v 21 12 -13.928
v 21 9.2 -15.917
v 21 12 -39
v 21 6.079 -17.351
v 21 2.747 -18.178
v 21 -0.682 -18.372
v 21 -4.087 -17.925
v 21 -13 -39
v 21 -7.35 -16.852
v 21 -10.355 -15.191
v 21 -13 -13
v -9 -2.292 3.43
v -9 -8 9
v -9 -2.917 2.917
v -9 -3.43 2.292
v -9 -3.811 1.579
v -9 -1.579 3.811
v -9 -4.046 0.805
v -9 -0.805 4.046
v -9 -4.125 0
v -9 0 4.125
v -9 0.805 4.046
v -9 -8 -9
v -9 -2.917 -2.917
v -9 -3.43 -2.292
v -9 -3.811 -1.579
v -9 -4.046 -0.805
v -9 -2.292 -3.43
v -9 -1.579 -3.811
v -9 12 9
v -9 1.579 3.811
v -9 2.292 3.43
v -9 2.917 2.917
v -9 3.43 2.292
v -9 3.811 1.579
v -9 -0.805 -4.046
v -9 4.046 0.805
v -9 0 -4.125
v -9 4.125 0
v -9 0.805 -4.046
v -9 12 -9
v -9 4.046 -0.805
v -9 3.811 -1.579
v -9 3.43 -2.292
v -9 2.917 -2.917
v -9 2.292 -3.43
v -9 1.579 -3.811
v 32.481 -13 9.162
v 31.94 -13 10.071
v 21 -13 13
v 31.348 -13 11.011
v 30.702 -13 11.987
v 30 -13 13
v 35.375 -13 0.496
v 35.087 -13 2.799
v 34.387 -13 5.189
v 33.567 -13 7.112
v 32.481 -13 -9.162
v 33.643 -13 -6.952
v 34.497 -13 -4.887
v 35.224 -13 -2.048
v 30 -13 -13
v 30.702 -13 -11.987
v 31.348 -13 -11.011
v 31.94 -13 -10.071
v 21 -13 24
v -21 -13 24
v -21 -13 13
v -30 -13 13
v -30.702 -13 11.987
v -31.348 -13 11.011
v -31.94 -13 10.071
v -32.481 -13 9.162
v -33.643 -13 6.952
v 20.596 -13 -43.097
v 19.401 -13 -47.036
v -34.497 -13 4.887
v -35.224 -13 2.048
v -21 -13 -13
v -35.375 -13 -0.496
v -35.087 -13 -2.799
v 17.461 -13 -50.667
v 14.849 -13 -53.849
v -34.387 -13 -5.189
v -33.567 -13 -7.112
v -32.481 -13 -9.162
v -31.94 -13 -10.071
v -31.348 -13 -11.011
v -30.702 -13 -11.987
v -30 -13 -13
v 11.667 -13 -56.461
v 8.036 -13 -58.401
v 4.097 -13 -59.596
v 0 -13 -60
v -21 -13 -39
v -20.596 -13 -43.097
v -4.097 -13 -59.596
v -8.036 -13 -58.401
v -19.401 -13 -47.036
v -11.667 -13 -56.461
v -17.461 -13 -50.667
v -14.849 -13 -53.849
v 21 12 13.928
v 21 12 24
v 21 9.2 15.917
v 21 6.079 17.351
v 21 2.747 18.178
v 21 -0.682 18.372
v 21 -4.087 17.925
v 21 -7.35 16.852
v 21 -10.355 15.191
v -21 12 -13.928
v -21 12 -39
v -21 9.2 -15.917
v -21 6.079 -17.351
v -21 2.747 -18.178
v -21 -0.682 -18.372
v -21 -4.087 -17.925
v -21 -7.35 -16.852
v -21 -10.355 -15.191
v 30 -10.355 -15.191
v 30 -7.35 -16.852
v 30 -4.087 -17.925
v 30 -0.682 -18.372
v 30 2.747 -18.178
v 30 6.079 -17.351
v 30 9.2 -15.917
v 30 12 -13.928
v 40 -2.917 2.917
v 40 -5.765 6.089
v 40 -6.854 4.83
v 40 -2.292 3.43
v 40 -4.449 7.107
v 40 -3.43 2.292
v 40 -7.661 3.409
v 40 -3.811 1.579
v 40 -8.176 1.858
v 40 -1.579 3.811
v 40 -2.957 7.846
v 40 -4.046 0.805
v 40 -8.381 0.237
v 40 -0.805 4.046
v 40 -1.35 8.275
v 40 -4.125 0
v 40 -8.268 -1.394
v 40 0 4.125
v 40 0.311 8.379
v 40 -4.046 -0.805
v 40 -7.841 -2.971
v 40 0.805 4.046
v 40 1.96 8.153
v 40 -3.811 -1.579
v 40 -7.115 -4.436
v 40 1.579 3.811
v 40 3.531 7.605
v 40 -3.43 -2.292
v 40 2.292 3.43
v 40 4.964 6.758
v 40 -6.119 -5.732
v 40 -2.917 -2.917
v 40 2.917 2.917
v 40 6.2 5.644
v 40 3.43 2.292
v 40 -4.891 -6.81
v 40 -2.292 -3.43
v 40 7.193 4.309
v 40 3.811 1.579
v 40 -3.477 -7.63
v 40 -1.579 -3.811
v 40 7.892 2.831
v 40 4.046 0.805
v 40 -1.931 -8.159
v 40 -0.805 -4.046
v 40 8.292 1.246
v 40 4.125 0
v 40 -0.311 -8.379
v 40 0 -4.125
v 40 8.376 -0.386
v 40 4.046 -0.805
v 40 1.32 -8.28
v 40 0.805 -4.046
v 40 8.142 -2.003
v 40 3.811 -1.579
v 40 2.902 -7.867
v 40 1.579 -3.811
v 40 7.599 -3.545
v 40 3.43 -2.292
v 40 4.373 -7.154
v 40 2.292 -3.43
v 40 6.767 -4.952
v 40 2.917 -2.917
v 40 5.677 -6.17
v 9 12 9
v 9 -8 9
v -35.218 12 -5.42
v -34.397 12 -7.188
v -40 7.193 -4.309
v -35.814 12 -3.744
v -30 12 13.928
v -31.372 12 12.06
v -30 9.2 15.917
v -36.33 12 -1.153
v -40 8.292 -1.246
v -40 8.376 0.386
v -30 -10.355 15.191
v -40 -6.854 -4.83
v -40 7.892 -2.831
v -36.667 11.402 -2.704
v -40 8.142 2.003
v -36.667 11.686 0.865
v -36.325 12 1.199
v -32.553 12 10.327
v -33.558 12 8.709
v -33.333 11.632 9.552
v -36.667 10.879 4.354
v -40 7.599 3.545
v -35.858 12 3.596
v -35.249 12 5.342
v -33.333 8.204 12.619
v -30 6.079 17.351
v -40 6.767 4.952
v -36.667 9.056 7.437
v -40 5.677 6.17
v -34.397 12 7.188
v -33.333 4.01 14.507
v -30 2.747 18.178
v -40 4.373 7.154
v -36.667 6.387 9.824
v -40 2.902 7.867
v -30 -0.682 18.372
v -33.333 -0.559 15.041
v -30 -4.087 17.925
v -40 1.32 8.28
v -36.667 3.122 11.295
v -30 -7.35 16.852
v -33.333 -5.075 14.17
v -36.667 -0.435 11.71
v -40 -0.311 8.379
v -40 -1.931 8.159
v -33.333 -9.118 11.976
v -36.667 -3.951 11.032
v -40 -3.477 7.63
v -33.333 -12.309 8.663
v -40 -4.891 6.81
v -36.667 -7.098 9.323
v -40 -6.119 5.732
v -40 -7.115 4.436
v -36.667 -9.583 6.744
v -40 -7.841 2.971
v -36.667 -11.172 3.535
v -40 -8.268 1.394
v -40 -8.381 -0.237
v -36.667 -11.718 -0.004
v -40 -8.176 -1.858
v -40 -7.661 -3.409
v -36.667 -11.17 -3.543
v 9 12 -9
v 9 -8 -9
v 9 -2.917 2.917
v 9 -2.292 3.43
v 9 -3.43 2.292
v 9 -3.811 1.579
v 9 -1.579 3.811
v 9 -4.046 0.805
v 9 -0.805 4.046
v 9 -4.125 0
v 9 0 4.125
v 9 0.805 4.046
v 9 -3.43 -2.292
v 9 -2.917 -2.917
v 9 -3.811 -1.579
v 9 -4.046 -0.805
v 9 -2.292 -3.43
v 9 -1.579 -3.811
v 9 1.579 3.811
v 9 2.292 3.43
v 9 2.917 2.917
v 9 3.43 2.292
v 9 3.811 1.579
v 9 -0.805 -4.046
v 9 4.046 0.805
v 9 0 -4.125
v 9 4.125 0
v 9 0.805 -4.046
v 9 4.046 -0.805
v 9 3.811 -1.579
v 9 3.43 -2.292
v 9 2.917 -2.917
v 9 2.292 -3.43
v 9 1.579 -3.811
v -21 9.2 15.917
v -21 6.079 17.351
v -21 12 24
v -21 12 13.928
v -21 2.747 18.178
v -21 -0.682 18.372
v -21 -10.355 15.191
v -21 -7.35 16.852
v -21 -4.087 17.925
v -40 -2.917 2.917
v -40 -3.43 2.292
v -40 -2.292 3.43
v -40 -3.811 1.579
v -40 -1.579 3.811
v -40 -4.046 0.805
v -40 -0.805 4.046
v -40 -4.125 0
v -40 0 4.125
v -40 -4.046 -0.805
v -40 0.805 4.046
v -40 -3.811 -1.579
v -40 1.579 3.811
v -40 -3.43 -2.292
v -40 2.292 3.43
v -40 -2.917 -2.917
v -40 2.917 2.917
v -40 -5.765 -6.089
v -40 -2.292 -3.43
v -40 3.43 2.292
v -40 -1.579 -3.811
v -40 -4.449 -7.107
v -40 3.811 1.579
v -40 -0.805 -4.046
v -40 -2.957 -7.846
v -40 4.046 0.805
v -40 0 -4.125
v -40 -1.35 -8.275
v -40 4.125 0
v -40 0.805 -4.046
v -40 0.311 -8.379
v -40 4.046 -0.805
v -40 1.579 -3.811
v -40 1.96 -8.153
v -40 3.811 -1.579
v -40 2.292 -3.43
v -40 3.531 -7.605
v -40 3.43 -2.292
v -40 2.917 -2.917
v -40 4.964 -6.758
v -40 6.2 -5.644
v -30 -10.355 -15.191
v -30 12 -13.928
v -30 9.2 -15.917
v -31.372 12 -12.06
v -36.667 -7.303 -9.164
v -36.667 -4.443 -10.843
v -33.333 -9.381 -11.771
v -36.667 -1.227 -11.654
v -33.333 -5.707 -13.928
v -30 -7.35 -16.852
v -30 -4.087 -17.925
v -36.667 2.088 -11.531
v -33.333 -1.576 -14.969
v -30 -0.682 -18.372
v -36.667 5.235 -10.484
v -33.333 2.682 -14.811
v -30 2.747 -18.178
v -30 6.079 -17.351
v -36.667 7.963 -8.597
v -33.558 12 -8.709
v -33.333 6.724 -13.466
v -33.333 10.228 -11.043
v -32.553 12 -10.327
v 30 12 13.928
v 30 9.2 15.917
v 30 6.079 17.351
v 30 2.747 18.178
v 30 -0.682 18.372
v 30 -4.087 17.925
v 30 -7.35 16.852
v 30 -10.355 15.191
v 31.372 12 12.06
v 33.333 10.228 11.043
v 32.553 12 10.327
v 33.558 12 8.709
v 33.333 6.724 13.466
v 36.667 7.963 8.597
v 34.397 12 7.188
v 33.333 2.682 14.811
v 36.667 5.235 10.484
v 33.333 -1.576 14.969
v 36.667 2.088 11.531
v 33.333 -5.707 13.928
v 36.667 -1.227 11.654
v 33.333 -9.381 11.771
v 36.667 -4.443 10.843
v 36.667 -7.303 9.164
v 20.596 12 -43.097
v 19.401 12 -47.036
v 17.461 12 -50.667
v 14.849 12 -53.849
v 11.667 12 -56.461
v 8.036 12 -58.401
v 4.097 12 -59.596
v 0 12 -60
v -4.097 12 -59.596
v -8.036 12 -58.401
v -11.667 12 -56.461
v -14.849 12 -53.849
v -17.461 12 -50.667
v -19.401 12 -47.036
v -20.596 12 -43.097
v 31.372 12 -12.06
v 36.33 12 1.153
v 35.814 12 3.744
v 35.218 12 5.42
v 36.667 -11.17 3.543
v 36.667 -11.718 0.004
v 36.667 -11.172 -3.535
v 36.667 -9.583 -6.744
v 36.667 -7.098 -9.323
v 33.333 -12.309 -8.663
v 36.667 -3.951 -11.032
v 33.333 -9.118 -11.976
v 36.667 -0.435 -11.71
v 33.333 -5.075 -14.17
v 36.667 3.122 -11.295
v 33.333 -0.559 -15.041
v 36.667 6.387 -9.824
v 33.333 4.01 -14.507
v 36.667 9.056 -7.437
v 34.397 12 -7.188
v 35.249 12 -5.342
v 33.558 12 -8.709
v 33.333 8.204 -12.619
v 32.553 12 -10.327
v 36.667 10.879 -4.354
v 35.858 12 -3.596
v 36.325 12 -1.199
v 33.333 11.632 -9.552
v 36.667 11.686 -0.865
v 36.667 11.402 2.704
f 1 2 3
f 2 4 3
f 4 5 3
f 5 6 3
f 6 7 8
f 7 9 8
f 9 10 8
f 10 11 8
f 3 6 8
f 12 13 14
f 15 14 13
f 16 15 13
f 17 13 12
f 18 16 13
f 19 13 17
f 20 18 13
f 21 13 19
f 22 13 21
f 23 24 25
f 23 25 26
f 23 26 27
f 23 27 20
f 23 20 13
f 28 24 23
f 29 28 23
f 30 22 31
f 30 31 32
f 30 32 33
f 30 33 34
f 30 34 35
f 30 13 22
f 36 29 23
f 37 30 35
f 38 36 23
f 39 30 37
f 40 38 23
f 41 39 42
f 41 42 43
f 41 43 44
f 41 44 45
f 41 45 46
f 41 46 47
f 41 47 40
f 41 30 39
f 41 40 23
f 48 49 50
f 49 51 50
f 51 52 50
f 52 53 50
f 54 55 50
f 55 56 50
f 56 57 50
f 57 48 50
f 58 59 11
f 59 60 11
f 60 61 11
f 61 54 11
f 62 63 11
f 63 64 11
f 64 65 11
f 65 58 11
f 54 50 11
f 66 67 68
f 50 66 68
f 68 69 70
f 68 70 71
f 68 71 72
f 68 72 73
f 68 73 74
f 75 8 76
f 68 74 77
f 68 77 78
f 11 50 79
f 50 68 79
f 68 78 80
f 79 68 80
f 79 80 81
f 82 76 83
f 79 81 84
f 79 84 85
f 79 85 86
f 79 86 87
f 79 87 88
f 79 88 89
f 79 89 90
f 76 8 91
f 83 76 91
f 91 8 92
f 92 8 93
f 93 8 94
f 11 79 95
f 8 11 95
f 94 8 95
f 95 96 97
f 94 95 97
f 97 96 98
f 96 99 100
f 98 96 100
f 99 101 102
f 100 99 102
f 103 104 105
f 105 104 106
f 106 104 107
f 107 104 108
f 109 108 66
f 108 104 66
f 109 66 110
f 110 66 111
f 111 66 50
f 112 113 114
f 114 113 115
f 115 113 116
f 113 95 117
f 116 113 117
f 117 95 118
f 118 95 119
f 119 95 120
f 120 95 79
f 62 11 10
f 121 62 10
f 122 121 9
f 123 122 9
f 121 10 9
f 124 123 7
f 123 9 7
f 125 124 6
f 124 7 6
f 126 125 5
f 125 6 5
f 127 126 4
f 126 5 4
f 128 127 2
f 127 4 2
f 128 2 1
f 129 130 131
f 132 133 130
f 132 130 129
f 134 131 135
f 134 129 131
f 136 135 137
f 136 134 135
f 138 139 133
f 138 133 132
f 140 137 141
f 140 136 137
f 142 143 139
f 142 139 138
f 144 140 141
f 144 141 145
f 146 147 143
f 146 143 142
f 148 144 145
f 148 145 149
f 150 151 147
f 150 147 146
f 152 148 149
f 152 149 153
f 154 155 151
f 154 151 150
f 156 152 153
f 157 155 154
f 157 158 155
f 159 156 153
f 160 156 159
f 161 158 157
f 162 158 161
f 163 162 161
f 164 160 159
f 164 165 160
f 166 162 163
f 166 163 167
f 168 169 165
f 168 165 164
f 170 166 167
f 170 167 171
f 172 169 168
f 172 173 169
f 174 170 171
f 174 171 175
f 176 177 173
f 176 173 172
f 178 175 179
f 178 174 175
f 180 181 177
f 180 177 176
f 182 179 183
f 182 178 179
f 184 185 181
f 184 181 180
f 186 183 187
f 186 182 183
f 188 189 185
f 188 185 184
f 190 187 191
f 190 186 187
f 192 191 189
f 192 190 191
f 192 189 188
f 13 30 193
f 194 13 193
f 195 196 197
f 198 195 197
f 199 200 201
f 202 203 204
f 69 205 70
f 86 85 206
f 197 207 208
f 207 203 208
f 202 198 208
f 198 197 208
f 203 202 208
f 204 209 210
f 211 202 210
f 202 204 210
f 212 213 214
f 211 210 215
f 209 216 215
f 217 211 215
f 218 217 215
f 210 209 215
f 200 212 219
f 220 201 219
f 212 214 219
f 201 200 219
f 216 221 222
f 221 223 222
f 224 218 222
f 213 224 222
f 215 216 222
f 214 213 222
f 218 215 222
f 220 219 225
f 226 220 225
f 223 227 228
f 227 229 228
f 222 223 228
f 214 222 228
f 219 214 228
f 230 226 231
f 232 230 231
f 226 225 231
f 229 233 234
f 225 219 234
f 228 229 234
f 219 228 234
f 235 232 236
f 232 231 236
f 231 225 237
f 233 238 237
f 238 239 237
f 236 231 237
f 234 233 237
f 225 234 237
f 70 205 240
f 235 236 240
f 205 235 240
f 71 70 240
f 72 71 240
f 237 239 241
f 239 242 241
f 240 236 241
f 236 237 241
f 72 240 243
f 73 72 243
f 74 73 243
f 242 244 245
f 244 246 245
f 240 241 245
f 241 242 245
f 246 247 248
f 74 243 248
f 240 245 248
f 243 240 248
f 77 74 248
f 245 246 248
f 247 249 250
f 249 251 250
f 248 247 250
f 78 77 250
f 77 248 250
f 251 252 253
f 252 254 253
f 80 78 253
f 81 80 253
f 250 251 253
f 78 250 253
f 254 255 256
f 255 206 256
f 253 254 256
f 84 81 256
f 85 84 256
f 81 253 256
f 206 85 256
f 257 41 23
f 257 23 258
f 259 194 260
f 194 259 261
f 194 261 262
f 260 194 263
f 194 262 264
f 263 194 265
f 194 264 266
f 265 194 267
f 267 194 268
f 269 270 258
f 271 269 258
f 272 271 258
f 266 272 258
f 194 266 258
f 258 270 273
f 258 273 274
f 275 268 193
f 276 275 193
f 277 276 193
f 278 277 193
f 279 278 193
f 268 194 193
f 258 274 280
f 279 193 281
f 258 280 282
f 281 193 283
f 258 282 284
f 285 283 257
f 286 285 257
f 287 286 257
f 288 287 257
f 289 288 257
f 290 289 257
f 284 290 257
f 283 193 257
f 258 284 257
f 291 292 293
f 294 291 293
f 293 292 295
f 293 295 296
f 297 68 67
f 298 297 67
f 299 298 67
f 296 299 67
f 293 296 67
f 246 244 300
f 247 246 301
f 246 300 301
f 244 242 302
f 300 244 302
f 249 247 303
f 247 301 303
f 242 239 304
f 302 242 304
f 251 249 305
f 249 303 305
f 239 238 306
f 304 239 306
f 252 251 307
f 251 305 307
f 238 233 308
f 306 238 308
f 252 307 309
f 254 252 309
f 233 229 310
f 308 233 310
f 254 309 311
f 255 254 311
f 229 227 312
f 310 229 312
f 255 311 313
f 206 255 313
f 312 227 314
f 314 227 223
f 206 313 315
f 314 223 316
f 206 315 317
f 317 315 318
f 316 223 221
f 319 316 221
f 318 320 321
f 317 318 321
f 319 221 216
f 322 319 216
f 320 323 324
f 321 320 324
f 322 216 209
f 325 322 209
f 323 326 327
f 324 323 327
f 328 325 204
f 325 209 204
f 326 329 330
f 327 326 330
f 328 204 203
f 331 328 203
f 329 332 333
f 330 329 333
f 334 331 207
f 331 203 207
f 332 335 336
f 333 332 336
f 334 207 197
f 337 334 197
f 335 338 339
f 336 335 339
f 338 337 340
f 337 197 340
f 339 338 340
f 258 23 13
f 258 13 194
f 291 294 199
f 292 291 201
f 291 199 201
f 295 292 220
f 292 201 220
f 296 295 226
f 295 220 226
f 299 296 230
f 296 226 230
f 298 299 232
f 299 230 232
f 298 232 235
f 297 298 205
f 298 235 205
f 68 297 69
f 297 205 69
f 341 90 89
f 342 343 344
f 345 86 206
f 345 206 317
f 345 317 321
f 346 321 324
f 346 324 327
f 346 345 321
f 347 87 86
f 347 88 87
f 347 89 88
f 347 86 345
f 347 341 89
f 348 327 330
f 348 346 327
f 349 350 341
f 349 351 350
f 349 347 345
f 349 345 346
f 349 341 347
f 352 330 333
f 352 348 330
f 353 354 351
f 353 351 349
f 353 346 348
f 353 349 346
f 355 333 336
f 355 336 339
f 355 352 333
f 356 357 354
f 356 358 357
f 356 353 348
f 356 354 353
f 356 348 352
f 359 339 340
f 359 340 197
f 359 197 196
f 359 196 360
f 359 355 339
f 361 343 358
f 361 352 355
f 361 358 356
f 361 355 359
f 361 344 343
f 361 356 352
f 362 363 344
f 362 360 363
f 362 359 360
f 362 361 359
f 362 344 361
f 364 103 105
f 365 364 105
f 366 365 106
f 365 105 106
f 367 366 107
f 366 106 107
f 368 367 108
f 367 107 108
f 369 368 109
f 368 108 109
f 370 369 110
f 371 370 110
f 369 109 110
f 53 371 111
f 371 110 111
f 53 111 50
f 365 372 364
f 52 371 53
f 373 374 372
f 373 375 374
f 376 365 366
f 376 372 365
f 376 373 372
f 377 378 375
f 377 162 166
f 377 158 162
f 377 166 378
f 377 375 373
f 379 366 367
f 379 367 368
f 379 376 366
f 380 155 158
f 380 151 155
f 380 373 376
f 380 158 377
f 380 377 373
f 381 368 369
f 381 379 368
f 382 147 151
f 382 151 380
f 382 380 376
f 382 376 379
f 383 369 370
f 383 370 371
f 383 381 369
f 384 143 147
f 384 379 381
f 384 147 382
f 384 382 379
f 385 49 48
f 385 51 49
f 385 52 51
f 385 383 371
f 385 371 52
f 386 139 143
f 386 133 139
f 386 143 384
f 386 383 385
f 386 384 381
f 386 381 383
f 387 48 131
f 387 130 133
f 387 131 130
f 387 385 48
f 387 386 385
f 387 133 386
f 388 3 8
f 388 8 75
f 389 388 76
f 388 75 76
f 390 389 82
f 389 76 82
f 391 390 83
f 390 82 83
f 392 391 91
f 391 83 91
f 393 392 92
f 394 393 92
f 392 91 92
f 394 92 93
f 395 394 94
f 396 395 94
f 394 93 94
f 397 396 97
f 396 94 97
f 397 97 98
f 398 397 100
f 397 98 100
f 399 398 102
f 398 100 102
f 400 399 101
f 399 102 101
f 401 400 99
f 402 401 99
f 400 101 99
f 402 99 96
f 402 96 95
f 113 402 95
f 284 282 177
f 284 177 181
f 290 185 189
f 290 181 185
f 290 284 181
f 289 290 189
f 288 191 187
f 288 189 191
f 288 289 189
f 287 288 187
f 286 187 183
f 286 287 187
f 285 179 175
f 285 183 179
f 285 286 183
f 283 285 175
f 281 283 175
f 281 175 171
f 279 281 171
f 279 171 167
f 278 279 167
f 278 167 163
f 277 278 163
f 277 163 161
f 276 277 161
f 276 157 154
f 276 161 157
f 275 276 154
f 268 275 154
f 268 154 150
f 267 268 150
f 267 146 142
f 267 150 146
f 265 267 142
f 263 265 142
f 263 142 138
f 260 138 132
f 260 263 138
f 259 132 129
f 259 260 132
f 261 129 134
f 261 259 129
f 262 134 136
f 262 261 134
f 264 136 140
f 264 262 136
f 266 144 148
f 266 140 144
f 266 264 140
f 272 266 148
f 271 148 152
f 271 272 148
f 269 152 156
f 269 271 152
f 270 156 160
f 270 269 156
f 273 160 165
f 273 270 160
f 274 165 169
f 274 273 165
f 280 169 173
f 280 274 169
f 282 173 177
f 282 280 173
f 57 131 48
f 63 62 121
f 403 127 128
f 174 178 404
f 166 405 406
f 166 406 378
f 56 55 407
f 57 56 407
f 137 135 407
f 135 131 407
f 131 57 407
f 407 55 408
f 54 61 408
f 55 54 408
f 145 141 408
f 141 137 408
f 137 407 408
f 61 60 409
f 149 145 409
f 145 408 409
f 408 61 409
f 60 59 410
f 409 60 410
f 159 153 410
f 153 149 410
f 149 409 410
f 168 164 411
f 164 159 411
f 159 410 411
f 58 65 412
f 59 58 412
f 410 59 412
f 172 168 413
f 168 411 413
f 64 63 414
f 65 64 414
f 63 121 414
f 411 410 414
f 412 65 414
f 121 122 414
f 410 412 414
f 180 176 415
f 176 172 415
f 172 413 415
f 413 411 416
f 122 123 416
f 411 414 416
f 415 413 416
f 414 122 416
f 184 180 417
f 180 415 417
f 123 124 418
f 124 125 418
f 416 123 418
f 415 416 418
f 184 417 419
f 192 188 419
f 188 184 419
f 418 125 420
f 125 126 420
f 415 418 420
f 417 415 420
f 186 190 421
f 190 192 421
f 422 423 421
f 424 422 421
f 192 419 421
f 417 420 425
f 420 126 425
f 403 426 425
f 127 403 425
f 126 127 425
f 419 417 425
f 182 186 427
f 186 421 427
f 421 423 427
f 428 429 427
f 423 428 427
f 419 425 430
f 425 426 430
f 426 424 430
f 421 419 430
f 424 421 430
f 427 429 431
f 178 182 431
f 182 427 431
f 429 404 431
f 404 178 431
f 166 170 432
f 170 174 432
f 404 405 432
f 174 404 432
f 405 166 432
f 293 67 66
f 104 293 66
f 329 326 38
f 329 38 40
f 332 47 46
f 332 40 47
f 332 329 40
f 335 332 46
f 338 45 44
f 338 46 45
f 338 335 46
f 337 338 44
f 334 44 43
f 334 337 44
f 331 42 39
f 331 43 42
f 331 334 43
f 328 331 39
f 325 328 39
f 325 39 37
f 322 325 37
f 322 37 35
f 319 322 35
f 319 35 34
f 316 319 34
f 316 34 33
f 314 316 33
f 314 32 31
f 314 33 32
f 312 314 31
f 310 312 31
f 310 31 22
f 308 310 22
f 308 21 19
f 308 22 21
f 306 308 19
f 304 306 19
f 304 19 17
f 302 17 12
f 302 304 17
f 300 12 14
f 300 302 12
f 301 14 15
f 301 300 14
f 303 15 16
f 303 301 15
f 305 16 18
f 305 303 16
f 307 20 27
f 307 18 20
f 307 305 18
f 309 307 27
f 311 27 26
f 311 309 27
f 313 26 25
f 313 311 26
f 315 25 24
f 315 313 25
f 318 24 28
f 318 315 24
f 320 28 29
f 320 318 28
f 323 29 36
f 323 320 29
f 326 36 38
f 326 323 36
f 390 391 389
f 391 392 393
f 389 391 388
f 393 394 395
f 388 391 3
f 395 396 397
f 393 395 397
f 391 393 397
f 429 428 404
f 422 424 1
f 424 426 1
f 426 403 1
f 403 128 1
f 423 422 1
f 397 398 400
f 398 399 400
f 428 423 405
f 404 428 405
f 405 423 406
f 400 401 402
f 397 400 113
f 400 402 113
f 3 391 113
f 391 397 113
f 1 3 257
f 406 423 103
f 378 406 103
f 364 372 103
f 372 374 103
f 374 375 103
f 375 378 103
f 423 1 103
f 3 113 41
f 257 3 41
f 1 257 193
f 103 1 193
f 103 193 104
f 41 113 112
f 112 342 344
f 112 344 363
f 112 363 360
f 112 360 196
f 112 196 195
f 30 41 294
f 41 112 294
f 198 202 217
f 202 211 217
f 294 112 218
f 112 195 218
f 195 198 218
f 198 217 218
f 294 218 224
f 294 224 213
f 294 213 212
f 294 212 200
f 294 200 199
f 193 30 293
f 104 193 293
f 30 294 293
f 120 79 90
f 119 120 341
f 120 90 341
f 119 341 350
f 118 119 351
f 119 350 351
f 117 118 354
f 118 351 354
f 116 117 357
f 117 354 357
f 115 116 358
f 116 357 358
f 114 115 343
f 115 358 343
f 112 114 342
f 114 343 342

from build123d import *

# Parameters (mm, degrees)
BOSS_EXTRUDE1_DEPTH      = 12
BOSS_EXTRUDE1_DEPTH_BACK = 13
BOSS_EXTRUDE2_START      = -40
BOSS_EXTRUDE2_DEPTH      = 80
SKETCH2_W                = 18
SKETCH2_H                = 18
CUT_EXTRUDE1_DEPTH       = 20
CUT_EXTRUDE2_DEPTH       = 74.273460407
CUT_EXTRUDE2_DEPTH_BACK  = 74.273460407
SKETCH5_R                = 4.125
CHAMFER1_SIZE            = 10


# Read off the part's stored shape, not the designer's step: Boss-Extrude2
with BuildPart() as part:
    # Sketch1 → Boss-Extrude1 (new, two sides: drawn at the far end of the back side and taken through both)
    with BuildSketch(Plane(origin=(0, 0, 0), x_dir=(1, 0, 0), z_dir=(0, 1, 0)).offset(-BOSS_EXTRUDE1_DEPTH_BACK)):
        with BuildLine():
            Line((-21, -24), (21, -24))
            Line((21, -24), (21, 39))
            ThreePointArc((21, 39), (0, 60), (-21, 39))
            Line((-21, 39), (-21, -24))
        make_face()
    extrude(amount=BOSS_EXTRUDE1_DEPTH + BOSS_EXTRUDE1_DEPTH_BACK)

    # Boss-Extrude2 outline → Boss-Extrude2 (add)
    with BuildSketch(Plane(origin=(0, 0, 0), x_dir=(0, 0, -1), z_dir=(1, 0, 0)).offset(BOSS_EXTRUDE2_START)):
        with BuildLine():
            Line((-13, -13), (13, -13))
            ThreePointArc((13, -13), (18.372112666, -0.682258161), (13.928388277, 12))
            Line((13.928388277, 12), (-13.928388277, 12))
            ThreePointArc((-13.928388277, 12), (-18.372112666, -0.682258161), (-13, -13))
        make_face()
    extrude(amount=BOSS_EXTRUDE2_DEPTH)

    # Sketch2 → Cut-Extrude1 (cut)
    with BuildSketch(Plane(origin=(0, 12, 0), x_dir=(1, 0, 0), z_dir=(0, 1, 0))):
        Rectangle(SKETCH2_W, SKETCH2_H)
    extrude(amount=-CUT_EXTRUDE1_DEPTH, mode=Mode.SUBTRACT)

    # Sketch5 → Cut-Extrude2 (cut, two sides: drawn at the far end of the back side and taken through both)
    with BuildSketch(Plane(origin=(0, 0, 0), x_dir=(0, 0, -1), z_dir=(1, 0, 0)).offset(-CUT_EXTRUDE2_DEPTH_BACK)):
        Circle(SKETCH5_R)
    extrude(amount=CUT_EXTRUDE2_DEPTH + CUT_EXTRUDE2_DEPTH_BACK, mode=Mode.SUBTRACT)

    # Chamfer1
    # the kernel refuses this chamfer: 10 mm, written as the material it takes off along each edge
    with BuildSketch(Plane(origin=(40, 0, -1e-09), x_dir=(0, -0.8173943471187031, 0.5760785374394618), z_dir=(0, 0.5760785374394618, 0.8173943471187031))) as chamfer1_piece_1:
        Polygon((18.38477631 - CHAMFER1_SIZE, 0), (18.38477631, -CHAMFER1_SIZE), (18.38477631, 0), align=None)
    revolve(axis=Axis((40, 0, -1e-09), (1, 0, 0)), revolution_arc=246.096931862, mode=Mode.SUBTRACT)
    with BuildSketch(Plane(origin=(40, 0, 1e-09), x_dir=(0, 0.8578700425310862, -0.5138667046304052), z_dir=(0, -0.5138667046304052, -0.8578700425310862))) as chamfer1_piece_2:
        Polygon((18.38477631, -CHAMFER1_SIZE), (18.38477631 - CHAMFER1_SIZE, 0), (18.38477631, 0), align=None)
    revolve(axis=Axis((40, 0, 1e-09), (1, 0, 0)), revolution_arc=246.096931862, mode=Mode.SUBTRACT)
    with BuildSketch(Plane(origin=(-40, 0, 1e-09), x_dir=(0, 0.8578700425310862, -0.5138667046304052), z_dir=(0, -0.5138667046304052, -0.8578700425310862))) as chamfer1_piece_3:
        Polygon((18.38477631, CHAMFER1_SIZE), (18.38477631 - CHAMFER1_SIZE, 0), (18.38477631, 0), align=None)
    revolve(axis=Axis((-40, 0, 1e-09), (1, 0, 0)), revolution_arc=246.096931862, mode=Mode.SUBTRACT)
    with BuildSketch(Plane(origin=(-40, 0, -1e-09), x_dir=(0, -0.8173943471187031, 0.5760785374394618), z_dir=(0, 0.5760785374394618, 0.8173943471187031))) as chamfer1_piece_4:
        Polygon((18.38477631 - CHAMFER1_SIZE, 0), (18.38477631, CHAMFER1_SIZE), (18.38477631, 0), align=None)
    revolve(axis=Axis((-40, 0, -1e-09), (1, 0, 0)), revolution_arc=246.096931862, mode=Mode.SUBTRACT)


solid = part.part
